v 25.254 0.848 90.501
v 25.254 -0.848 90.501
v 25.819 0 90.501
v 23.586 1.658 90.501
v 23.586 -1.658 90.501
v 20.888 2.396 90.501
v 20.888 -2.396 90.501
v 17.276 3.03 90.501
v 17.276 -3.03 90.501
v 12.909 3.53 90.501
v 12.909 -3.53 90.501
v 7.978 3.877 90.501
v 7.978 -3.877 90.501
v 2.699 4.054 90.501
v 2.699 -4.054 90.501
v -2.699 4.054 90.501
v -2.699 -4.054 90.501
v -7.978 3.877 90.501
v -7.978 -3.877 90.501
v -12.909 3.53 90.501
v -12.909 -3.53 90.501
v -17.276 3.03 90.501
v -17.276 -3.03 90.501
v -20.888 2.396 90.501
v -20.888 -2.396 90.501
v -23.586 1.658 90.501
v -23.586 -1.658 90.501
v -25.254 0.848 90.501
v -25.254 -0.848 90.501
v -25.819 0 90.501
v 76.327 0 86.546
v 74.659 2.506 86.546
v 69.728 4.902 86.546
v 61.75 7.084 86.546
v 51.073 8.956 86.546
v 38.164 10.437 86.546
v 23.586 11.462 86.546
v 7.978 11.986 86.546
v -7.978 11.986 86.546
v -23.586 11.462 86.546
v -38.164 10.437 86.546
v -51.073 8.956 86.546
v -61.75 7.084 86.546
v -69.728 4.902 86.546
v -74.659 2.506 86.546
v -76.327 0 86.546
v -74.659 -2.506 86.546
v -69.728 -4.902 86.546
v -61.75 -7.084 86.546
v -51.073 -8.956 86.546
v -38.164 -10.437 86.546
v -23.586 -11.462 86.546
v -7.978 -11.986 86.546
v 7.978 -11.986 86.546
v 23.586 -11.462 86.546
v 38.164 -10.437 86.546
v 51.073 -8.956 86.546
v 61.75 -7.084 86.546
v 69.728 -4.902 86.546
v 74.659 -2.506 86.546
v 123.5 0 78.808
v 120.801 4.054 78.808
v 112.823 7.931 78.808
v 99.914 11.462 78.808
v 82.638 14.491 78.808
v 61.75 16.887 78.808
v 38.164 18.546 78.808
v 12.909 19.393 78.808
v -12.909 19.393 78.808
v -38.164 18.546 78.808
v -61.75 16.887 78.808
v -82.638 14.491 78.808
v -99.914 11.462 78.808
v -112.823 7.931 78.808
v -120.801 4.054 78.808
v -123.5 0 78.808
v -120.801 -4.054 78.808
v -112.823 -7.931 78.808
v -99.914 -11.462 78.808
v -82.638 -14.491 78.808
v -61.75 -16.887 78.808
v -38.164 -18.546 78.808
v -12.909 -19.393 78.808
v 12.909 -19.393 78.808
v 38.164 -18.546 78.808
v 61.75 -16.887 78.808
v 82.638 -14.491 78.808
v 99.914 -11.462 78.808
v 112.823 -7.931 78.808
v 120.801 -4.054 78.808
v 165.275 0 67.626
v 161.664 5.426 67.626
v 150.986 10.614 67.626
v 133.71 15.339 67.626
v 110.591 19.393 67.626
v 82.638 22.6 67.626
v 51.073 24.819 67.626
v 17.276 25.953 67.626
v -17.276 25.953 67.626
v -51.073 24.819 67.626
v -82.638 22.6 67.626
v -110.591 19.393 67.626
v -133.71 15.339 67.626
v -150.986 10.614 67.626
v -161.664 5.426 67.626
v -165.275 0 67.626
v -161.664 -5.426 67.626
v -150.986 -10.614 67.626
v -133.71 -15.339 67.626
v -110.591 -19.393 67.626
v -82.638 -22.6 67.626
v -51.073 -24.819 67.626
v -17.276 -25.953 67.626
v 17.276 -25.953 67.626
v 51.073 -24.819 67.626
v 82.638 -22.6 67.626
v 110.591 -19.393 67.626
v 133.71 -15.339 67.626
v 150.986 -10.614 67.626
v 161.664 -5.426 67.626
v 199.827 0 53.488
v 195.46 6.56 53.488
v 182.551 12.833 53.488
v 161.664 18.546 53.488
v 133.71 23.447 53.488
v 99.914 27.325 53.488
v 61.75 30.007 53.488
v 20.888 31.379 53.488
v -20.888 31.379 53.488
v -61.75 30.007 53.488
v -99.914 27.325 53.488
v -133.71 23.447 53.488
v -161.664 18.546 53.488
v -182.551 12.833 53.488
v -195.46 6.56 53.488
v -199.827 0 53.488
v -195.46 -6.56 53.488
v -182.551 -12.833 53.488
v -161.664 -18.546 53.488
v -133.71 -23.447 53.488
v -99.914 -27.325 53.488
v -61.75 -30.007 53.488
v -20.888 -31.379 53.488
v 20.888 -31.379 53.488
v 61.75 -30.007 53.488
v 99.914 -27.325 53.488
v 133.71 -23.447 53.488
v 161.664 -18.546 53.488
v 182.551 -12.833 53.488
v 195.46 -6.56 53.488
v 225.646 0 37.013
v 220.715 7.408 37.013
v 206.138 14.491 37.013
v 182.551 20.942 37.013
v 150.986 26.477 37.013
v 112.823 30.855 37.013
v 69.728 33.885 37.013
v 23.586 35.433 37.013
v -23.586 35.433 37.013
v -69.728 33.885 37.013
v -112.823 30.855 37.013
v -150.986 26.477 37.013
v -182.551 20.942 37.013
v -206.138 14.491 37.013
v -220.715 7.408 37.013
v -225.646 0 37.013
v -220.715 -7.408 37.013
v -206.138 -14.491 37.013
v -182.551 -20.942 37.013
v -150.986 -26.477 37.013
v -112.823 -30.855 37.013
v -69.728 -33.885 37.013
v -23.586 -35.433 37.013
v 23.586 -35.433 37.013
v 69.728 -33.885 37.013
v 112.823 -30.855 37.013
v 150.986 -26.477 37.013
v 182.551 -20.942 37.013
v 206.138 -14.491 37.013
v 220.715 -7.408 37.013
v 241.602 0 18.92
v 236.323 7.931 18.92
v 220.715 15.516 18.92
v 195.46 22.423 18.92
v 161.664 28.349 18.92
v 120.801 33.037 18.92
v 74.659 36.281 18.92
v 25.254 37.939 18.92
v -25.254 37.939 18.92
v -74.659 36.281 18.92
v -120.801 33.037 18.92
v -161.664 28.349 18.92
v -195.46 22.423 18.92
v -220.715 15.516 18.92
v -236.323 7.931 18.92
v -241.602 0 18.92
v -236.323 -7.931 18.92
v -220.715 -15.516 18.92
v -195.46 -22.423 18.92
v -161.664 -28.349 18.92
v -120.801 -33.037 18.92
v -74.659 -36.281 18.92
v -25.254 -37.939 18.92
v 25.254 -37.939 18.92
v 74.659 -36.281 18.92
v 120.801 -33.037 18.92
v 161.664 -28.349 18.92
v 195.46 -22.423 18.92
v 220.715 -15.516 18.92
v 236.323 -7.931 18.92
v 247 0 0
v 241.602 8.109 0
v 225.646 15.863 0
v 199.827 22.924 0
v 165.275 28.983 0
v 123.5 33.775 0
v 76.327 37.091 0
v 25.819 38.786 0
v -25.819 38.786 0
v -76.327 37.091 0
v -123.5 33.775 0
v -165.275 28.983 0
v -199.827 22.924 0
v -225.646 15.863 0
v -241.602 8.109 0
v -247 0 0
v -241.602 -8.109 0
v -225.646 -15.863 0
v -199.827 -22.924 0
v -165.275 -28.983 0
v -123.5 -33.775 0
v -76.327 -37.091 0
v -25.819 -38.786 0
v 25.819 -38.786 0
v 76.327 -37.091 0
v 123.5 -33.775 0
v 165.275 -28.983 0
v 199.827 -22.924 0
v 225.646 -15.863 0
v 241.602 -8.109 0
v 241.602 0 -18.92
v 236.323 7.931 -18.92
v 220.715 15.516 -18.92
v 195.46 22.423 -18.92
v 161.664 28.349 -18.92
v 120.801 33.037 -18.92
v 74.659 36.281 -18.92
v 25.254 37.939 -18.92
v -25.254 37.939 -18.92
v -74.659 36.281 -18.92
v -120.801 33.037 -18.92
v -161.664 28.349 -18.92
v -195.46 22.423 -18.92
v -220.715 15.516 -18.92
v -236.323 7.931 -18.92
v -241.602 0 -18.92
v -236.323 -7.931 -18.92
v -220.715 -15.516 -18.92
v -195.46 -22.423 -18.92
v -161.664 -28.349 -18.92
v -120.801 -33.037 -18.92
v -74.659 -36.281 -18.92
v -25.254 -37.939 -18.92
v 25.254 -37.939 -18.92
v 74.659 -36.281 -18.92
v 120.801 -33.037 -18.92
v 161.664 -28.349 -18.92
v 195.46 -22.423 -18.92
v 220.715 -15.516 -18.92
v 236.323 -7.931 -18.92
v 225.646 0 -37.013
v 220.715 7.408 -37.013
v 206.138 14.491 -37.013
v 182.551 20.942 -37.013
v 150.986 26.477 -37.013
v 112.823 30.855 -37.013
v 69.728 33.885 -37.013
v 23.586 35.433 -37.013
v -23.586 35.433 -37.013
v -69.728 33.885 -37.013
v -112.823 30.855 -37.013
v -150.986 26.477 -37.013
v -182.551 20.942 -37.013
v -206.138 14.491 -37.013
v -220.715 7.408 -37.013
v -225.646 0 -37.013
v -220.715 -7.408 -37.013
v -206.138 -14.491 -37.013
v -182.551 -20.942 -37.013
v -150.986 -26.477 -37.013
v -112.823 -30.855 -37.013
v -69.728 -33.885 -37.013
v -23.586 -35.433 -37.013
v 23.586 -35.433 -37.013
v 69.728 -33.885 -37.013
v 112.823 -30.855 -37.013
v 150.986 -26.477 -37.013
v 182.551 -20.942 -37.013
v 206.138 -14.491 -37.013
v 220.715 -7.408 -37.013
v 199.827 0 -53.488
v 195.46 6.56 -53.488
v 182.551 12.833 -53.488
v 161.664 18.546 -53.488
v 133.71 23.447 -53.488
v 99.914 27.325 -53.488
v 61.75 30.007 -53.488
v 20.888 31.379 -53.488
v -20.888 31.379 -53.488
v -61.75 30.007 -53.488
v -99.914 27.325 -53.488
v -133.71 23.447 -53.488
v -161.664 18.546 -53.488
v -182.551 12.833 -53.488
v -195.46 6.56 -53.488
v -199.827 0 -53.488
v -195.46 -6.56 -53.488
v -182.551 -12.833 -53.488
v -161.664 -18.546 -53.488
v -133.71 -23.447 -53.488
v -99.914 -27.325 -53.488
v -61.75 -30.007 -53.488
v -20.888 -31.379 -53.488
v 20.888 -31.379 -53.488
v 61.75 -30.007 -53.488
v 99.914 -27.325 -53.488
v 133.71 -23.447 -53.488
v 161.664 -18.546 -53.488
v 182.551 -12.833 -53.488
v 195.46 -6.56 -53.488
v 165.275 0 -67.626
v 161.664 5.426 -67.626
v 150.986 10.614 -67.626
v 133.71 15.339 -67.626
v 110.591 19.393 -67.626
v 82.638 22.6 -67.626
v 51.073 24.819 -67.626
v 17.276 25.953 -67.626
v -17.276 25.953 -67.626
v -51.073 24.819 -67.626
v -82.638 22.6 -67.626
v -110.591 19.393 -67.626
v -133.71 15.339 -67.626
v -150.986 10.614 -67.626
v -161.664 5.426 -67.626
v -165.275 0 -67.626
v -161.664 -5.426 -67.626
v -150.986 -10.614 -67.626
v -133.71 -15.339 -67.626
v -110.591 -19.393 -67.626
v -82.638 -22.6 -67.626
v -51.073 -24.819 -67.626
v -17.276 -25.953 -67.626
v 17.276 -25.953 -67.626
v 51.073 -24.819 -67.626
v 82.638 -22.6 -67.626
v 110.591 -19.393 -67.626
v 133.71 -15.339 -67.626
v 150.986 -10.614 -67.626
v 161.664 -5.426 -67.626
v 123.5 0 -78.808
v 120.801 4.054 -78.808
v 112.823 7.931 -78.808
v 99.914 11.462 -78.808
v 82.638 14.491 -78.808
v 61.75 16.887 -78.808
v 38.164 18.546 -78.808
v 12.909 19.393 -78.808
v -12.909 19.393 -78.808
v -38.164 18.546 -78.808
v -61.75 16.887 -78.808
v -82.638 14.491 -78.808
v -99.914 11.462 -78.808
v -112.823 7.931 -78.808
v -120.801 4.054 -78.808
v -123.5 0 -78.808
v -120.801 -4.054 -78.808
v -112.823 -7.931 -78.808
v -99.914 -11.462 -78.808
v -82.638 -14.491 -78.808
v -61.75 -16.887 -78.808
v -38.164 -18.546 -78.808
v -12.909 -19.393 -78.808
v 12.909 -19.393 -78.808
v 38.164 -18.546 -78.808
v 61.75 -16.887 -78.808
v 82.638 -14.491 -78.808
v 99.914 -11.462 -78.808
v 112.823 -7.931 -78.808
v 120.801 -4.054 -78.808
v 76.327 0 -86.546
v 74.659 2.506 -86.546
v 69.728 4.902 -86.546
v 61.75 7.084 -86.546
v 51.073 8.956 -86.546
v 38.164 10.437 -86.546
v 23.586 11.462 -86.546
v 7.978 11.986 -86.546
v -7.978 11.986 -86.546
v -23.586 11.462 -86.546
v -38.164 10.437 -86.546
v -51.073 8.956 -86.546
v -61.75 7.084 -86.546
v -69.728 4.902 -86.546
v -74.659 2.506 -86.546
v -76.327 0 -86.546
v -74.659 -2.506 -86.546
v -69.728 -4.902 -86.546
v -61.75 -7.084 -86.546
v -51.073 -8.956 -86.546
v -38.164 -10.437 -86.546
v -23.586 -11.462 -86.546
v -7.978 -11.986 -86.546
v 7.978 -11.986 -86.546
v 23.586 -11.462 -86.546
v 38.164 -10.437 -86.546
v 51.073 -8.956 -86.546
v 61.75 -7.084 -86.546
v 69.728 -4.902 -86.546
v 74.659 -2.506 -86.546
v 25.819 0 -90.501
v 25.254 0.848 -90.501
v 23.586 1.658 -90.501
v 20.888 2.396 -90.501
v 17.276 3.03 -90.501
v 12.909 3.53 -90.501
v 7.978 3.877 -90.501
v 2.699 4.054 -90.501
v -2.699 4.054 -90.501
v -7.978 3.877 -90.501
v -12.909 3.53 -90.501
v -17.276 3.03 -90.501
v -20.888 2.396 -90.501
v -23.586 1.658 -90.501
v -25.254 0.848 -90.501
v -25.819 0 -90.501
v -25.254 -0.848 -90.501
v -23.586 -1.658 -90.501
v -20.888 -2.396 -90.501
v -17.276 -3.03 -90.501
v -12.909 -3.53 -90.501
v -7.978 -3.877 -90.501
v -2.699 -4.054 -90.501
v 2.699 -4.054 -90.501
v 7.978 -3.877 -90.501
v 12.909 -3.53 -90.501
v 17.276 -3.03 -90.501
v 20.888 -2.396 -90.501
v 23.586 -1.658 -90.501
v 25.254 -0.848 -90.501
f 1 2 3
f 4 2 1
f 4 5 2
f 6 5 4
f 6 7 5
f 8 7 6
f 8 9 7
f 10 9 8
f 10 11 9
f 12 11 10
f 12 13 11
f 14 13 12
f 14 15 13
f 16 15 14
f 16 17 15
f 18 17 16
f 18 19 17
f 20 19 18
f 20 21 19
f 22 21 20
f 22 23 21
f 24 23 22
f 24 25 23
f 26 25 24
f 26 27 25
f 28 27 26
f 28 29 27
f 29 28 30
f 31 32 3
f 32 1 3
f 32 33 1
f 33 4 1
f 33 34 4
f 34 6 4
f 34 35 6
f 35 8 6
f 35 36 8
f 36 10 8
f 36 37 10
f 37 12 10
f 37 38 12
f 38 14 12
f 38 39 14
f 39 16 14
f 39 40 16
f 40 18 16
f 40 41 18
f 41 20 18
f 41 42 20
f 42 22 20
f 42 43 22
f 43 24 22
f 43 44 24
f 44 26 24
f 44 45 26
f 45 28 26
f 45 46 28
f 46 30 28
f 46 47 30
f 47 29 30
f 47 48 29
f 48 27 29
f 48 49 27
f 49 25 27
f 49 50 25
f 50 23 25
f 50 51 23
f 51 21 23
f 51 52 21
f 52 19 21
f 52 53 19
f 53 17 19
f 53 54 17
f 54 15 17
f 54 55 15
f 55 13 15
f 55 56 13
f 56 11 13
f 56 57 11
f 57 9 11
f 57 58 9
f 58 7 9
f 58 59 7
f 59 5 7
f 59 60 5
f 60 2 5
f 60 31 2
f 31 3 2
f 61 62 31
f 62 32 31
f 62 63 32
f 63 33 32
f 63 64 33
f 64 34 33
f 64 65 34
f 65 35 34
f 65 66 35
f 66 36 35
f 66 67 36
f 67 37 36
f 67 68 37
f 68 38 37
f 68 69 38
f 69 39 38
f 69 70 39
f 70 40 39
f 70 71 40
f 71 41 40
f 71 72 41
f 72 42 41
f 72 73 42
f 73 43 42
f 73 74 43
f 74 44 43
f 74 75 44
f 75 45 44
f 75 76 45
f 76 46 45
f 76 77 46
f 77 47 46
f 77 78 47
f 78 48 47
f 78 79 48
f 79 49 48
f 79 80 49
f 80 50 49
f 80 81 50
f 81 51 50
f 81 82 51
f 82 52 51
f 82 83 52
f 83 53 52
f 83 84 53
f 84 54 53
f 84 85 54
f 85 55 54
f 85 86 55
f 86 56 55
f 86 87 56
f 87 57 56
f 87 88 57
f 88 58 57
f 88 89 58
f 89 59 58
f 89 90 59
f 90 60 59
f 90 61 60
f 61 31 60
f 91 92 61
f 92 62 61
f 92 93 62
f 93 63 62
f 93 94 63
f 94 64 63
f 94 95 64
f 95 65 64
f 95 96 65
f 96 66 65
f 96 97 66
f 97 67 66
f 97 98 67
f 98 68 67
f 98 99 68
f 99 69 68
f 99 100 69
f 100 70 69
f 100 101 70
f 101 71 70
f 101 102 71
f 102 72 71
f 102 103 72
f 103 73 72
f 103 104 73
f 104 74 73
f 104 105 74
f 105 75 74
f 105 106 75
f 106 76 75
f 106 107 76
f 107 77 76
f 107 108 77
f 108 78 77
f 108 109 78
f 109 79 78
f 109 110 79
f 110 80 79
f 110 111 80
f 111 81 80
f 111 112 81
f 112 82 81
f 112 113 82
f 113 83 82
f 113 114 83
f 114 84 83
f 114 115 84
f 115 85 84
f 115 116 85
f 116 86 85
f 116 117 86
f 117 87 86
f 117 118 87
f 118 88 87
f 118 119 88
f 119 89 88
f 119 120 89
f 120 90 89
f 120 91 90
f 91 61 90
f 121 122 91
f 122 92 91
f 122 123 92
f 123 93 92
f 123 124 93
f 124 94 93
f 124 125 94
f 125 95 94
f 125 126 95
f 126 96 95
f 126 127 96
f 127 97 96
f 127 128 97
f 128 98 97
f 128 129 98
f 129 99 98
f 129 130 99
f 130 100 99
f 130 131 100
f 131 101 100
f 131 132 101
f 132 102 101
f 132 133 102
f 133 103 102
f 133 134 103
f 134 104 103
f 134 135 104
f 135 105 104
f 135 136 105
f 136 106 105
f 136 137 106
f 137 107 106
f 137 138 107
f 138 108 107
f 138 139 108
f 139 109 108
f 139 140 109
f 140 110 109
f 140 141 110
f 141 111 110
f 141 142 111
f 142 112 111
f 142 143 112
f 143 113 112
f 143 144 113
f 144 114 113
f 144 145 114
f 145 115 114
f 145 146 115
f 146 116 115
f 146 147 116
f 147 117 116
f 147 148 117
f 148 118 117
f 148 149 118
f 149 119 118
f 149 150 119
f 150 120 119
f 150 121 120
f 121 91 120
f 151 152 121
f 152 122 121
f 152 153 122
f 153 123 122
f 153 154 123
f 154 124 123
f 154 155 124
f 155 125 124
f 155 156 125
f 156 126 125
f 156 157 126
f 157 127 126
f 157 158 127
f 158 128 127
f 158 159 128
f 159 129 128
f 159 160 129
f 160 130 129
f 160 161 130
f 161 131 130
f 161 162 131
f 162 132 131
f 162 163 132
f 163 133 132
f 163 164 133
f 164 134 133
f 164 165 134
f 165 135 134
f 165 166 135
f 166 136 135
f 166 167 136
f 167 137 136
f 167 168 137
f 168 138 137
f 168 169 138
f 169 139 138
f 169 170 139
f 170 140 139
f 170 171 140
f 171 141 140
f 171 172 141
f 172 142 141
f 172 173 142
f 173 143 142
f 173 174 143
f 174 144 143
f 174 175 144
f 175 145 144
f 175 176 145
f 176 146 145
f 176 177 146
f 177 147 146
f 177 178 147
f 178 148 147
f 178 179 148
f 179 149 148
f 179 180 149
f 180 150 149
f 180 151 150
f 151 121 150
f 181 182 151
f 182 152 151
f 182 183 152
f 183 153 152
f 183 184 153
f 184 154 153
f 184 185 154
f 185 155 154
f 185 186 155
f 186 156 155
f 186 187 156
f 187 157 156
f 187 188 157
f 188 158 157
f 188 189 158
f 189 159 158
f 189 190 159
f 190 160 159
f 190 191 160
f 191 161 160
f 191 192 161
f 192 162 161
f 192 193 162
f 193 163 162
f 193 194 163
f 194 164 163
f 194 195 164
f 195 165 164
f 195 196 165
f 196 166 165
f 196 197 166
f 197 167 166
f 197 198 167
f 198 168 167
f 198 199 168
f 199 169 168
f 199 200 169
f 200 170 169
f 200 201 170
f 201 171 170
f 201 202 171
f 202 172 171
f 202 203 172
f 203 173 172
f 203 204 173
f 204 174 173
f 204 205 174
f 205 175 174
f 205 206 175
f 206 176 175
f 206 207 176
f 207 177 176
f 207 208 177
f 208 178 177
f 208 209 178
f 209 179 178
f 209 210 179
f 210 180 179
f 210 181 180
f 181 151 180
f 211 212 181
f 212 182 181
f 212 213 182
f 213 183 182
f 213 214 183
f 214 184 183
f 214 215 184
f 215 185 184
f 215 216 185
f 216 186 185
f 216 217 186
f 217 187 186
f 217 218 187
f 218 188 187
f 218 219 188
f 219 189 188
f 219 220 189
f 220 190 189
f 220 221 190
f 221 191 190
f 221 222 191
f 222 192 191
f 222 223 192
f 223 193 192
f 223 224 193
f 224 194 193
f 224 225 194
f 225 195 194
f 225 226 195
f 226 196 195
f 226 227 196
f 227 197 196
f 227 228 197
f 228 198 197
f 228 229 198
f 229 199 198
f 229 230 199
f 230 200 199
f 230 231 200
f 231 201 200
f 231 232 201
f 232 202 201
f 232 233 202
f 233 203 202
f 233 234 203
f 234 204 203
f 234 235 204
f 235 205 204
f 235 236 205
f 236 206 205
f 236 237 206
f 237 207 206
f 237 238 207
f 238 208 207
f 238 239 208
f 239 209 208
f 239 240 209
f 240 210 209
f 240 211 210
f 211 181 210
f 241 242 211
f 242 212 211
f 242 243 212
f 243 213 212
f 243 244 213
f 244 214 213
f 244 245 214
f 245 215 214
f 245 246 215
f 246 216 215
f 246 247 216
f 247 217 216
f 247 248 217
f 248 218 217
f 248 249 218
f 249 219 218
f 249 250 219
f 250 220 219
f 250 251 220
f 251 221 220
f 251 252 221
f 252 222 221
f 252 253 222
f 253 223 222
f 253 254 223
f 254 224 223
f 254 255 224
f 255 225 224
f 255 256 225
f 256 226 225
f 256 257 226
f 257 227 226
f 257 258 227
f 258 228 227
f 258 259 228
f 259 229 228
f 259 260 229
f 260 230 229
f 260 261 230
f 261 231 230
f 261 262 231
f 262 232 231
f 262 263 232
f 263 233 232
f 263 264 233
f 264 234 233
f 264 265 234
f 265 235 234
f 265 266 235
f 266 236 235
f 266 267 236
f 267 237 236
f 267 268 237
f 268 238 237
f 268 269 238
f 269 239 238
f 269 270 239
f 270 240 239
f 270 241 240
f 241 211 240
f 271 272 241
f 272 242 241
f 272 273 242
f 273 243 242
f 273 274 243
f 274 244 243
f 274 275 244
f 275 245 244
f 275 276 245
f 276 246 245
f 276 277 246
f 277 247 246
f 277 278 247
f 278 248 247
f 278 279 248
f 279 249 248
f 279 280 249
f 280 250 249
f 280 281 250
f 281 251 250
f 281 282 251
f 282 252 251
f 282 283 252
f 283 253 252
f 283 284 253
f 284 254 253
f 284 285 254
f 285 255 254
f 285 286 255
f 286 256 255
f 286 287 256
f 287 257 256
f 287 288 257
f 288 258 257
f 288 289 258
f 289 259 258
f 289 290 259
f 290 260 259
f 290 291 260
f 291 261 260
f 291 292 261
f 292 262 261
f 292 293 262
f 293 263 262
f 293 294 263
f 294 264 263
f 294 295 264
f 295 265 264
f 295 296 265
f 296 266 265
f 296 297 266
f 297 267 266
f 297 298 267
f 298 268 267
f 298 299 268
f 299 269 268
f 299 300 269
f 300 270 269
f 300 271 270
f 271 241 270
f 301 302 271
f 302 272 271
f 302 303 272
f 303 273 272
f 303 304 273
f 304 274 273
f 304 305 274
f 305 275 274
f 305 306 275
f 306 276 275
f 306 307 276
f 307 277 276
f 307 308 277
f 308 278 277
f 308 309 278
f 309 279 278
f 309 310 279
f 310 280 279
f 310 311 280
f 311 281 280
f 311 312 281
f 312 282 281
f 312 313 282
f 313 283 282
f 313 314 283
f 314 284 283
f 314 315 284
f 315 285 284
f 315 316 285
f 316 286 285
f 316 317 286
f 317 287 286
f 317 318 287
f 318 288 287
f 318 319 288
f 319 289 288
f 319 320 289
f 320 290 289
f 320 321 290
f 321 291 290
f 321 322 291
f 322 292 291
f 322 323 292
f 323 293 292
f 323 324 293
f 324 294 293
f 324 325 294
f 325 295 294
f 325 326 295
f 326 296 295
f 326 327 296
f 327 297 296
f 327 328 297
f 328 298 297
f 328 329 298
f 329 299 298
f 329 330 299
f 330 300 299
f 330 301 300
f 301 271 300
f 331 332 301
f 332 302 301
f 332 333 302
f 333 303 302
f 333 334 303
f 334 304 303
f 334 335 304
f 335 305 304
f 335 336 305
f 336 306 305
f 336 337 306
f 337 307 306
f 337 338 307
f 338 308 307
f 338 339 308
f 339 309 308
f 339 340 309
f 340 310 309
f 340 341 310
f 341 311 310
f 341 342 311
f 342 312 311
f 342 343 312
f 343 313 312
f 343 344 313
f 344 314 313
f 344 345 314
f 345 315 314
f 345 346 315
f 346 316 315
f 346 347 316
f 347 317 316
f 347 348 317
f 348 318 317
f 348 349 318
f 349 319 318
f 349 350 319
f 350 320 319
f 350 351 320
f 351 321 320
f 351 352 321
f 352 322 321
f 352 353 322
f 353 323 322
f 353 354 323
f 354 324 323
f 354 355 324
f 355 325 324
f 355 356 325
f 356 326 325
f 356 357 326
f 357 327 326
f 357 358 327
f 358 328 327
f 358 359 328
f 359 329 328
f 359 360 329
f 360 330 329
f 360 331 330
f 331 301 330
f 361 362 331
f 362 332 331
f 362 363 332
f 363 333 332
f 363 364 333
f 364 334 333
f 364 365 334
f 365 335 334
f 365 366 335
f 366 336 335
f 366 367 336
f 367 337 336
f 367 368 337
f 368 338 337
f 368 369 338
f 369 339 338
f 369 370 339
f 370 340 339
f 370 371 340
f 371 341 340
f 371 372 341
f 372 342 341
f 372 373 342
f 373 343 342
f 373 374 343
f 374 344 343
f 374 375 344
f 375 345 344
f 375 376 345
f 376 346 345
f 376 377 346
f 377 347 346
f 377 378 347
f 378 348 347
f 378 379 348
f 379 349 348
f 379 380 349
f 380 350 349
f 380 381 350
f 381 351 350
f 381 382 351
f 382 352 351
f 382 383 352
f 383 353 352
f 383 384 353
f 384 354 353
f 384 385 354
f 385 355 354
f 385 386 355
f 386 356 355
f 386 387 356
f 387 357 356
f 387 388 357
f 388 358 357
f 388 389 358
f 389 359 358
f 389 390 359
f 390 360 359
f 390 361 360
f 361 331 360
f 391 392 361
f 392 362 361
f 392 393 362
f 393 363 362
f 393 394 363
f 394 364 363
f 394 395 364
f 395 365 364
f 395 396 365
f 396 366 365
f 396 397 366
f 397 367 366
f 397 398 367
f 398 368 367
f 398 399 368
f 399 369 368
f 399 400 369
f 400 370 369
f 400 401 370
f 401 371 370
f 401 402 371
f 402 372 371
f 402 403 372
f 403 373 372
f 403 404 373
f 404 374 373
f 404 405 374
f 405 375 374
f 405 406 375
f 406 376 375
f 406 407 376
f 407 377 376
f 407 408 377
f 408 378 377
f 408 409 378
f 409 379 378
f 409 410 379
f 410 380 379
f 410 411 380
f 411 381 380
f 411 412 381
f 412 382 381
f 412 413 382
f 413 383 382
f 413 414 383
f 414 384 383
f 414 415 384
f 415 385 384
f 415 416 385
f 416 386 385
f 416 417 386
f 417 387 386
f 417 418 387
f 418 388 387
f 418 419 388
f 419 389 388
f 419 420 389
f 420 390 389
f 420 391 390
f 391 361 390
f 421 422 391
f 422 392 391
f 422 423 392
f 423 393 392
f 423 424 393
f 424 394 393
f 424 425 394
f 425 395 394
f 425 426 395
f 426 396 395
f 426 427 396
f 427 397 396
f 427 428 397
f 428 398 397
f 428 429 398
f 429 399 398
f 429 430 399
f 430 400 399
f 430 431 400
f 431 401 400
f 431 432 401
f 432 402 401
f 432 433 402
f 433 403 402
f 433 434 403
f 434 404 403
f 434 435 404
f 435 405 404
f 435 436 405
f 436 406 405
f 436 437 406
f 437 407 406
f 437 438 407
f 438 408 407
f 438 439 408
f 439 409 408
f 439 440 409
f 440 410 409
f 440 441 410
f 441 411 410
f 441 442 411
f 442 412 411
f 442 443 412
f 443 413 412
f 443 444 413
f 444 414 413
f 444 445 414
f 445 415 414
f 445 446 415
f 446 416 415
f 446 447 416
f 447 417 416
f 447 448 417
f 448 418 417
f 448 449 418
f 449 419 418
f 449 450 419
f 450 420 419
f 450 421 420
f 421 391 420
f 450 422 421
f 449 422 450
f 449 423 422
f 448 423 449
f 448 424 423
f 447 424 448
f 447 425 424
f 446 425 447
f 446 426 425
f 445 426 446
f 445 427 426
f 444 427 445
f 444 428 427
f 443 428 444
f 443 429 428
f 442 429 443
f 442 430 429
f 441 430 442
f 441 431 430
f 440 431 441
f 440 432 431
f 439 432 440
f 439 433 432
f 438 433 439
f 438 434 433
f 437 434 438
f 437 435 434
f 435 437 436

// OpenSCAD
// Generated by SolidPython 1.0.1 on 2020-07-29 00:46:53


scale(v = [19, 3, 7]) {
	sphere(r = 13);
}
/***********************************************
*********      SolidPython code:      **********
************************************************
 
# import packages: SolidPython
from solid import *
from solid.utils import *
from itertools import chain, combinations, permutations


class Resize:

    def __init__(self, scad_file):
        self.scad_file = scad_file
        #self.scad_file = import_scad(scad_file)
        # cone/cylinder param:
        self.r1 = 0
        self.r2 = 0
        self.h = 0
        # rectangular prism param:
        self.w = 0
        self.l = 0
        # ellipse param:
        self.r = 0

    # import OpenScad code (file name corresponds to shape)


    # classify shape + parameters
    def assign(self, param1, param2, param3):
        if self.scad_file == 'cone.scad':
            self.r1 = param1
            self.r2 = param2
            self.h = param3
        elif self.scad_file == 'cylinder.scad':
            self.r1 = param1
            self.r2 = param2
            self.h = param3
        elif self.scad_file == 'rectangularPrism.scad':
            self.h = param1
            self.l = param2
            self.w = param3
        else:
            self.r = param1
            self.h = param2

    # resize parameters
    def iterate(self):
        x = range(3, 20, 2)
        i = 1
        if self.scad_file == 'cone.scad':
            tempList = list(permutations(x, 2))
            for temp in tempList:
                param1 = temp[0]
                param2 = temp[1]
                filepath = 'produced_scad_files/' + 'cone' + str(param1) + '_' + str(param2) + '_' + '.scad'
                scad_render_to_file(cylinder(h=param1, r1=param2, r2=0), filepath)

        elif self.scad_file == 'cylinder.scad':
            tempList = list(permutations(x, 3))
            for temp in tempList:
                param1 = temp[0]
                param2 = temp[1]
                filepath = 'produced_scad_files/' + 'cylinder' + str(param1) + '_' + str(param2) + '_' + '.scad'
                scad_render_to_file(cylinder(h=param1, r1=param2, r2=param2), filepath)

        elif self.scad_file == 'rectangularPrism.scad':
            tempList = list(permutations(x, 3))
            for temp in tempList:
                param1 = temp[0]
                param2 = temp[1]
                param3 = temp[2]
                filepath = 'produced_scad_files/' + 'rectangularPrism' + str(param1) + '_' + str(param2) + '_' + str(
                    param3) + '.scad'
                scad_render_to_file(cube(size=(param1, param2, param3)), filepath)

        elif self.scad_file == 'ellipse.scad':
            tempList = list(permutations(x, 4))
            for temp in tempList:
                param1 = temp[0]
                param2 = temp[1]
                param3 = temp[2]
                param4 = temp[3]
                filepath = 'produced_scad_files/' + 'ellipse' + str(param1) + '_' + str(param2) + '_' + str(param3) + '_' + str(param4) + '.scad'
                scad_render_to_file(scale([param1, param2, param3])(sphere(r=param4)), filepath)

    def render_to_scadfile(self):
        scad_render_to_file(scad, 'example.scad') 
 
************************************************/
